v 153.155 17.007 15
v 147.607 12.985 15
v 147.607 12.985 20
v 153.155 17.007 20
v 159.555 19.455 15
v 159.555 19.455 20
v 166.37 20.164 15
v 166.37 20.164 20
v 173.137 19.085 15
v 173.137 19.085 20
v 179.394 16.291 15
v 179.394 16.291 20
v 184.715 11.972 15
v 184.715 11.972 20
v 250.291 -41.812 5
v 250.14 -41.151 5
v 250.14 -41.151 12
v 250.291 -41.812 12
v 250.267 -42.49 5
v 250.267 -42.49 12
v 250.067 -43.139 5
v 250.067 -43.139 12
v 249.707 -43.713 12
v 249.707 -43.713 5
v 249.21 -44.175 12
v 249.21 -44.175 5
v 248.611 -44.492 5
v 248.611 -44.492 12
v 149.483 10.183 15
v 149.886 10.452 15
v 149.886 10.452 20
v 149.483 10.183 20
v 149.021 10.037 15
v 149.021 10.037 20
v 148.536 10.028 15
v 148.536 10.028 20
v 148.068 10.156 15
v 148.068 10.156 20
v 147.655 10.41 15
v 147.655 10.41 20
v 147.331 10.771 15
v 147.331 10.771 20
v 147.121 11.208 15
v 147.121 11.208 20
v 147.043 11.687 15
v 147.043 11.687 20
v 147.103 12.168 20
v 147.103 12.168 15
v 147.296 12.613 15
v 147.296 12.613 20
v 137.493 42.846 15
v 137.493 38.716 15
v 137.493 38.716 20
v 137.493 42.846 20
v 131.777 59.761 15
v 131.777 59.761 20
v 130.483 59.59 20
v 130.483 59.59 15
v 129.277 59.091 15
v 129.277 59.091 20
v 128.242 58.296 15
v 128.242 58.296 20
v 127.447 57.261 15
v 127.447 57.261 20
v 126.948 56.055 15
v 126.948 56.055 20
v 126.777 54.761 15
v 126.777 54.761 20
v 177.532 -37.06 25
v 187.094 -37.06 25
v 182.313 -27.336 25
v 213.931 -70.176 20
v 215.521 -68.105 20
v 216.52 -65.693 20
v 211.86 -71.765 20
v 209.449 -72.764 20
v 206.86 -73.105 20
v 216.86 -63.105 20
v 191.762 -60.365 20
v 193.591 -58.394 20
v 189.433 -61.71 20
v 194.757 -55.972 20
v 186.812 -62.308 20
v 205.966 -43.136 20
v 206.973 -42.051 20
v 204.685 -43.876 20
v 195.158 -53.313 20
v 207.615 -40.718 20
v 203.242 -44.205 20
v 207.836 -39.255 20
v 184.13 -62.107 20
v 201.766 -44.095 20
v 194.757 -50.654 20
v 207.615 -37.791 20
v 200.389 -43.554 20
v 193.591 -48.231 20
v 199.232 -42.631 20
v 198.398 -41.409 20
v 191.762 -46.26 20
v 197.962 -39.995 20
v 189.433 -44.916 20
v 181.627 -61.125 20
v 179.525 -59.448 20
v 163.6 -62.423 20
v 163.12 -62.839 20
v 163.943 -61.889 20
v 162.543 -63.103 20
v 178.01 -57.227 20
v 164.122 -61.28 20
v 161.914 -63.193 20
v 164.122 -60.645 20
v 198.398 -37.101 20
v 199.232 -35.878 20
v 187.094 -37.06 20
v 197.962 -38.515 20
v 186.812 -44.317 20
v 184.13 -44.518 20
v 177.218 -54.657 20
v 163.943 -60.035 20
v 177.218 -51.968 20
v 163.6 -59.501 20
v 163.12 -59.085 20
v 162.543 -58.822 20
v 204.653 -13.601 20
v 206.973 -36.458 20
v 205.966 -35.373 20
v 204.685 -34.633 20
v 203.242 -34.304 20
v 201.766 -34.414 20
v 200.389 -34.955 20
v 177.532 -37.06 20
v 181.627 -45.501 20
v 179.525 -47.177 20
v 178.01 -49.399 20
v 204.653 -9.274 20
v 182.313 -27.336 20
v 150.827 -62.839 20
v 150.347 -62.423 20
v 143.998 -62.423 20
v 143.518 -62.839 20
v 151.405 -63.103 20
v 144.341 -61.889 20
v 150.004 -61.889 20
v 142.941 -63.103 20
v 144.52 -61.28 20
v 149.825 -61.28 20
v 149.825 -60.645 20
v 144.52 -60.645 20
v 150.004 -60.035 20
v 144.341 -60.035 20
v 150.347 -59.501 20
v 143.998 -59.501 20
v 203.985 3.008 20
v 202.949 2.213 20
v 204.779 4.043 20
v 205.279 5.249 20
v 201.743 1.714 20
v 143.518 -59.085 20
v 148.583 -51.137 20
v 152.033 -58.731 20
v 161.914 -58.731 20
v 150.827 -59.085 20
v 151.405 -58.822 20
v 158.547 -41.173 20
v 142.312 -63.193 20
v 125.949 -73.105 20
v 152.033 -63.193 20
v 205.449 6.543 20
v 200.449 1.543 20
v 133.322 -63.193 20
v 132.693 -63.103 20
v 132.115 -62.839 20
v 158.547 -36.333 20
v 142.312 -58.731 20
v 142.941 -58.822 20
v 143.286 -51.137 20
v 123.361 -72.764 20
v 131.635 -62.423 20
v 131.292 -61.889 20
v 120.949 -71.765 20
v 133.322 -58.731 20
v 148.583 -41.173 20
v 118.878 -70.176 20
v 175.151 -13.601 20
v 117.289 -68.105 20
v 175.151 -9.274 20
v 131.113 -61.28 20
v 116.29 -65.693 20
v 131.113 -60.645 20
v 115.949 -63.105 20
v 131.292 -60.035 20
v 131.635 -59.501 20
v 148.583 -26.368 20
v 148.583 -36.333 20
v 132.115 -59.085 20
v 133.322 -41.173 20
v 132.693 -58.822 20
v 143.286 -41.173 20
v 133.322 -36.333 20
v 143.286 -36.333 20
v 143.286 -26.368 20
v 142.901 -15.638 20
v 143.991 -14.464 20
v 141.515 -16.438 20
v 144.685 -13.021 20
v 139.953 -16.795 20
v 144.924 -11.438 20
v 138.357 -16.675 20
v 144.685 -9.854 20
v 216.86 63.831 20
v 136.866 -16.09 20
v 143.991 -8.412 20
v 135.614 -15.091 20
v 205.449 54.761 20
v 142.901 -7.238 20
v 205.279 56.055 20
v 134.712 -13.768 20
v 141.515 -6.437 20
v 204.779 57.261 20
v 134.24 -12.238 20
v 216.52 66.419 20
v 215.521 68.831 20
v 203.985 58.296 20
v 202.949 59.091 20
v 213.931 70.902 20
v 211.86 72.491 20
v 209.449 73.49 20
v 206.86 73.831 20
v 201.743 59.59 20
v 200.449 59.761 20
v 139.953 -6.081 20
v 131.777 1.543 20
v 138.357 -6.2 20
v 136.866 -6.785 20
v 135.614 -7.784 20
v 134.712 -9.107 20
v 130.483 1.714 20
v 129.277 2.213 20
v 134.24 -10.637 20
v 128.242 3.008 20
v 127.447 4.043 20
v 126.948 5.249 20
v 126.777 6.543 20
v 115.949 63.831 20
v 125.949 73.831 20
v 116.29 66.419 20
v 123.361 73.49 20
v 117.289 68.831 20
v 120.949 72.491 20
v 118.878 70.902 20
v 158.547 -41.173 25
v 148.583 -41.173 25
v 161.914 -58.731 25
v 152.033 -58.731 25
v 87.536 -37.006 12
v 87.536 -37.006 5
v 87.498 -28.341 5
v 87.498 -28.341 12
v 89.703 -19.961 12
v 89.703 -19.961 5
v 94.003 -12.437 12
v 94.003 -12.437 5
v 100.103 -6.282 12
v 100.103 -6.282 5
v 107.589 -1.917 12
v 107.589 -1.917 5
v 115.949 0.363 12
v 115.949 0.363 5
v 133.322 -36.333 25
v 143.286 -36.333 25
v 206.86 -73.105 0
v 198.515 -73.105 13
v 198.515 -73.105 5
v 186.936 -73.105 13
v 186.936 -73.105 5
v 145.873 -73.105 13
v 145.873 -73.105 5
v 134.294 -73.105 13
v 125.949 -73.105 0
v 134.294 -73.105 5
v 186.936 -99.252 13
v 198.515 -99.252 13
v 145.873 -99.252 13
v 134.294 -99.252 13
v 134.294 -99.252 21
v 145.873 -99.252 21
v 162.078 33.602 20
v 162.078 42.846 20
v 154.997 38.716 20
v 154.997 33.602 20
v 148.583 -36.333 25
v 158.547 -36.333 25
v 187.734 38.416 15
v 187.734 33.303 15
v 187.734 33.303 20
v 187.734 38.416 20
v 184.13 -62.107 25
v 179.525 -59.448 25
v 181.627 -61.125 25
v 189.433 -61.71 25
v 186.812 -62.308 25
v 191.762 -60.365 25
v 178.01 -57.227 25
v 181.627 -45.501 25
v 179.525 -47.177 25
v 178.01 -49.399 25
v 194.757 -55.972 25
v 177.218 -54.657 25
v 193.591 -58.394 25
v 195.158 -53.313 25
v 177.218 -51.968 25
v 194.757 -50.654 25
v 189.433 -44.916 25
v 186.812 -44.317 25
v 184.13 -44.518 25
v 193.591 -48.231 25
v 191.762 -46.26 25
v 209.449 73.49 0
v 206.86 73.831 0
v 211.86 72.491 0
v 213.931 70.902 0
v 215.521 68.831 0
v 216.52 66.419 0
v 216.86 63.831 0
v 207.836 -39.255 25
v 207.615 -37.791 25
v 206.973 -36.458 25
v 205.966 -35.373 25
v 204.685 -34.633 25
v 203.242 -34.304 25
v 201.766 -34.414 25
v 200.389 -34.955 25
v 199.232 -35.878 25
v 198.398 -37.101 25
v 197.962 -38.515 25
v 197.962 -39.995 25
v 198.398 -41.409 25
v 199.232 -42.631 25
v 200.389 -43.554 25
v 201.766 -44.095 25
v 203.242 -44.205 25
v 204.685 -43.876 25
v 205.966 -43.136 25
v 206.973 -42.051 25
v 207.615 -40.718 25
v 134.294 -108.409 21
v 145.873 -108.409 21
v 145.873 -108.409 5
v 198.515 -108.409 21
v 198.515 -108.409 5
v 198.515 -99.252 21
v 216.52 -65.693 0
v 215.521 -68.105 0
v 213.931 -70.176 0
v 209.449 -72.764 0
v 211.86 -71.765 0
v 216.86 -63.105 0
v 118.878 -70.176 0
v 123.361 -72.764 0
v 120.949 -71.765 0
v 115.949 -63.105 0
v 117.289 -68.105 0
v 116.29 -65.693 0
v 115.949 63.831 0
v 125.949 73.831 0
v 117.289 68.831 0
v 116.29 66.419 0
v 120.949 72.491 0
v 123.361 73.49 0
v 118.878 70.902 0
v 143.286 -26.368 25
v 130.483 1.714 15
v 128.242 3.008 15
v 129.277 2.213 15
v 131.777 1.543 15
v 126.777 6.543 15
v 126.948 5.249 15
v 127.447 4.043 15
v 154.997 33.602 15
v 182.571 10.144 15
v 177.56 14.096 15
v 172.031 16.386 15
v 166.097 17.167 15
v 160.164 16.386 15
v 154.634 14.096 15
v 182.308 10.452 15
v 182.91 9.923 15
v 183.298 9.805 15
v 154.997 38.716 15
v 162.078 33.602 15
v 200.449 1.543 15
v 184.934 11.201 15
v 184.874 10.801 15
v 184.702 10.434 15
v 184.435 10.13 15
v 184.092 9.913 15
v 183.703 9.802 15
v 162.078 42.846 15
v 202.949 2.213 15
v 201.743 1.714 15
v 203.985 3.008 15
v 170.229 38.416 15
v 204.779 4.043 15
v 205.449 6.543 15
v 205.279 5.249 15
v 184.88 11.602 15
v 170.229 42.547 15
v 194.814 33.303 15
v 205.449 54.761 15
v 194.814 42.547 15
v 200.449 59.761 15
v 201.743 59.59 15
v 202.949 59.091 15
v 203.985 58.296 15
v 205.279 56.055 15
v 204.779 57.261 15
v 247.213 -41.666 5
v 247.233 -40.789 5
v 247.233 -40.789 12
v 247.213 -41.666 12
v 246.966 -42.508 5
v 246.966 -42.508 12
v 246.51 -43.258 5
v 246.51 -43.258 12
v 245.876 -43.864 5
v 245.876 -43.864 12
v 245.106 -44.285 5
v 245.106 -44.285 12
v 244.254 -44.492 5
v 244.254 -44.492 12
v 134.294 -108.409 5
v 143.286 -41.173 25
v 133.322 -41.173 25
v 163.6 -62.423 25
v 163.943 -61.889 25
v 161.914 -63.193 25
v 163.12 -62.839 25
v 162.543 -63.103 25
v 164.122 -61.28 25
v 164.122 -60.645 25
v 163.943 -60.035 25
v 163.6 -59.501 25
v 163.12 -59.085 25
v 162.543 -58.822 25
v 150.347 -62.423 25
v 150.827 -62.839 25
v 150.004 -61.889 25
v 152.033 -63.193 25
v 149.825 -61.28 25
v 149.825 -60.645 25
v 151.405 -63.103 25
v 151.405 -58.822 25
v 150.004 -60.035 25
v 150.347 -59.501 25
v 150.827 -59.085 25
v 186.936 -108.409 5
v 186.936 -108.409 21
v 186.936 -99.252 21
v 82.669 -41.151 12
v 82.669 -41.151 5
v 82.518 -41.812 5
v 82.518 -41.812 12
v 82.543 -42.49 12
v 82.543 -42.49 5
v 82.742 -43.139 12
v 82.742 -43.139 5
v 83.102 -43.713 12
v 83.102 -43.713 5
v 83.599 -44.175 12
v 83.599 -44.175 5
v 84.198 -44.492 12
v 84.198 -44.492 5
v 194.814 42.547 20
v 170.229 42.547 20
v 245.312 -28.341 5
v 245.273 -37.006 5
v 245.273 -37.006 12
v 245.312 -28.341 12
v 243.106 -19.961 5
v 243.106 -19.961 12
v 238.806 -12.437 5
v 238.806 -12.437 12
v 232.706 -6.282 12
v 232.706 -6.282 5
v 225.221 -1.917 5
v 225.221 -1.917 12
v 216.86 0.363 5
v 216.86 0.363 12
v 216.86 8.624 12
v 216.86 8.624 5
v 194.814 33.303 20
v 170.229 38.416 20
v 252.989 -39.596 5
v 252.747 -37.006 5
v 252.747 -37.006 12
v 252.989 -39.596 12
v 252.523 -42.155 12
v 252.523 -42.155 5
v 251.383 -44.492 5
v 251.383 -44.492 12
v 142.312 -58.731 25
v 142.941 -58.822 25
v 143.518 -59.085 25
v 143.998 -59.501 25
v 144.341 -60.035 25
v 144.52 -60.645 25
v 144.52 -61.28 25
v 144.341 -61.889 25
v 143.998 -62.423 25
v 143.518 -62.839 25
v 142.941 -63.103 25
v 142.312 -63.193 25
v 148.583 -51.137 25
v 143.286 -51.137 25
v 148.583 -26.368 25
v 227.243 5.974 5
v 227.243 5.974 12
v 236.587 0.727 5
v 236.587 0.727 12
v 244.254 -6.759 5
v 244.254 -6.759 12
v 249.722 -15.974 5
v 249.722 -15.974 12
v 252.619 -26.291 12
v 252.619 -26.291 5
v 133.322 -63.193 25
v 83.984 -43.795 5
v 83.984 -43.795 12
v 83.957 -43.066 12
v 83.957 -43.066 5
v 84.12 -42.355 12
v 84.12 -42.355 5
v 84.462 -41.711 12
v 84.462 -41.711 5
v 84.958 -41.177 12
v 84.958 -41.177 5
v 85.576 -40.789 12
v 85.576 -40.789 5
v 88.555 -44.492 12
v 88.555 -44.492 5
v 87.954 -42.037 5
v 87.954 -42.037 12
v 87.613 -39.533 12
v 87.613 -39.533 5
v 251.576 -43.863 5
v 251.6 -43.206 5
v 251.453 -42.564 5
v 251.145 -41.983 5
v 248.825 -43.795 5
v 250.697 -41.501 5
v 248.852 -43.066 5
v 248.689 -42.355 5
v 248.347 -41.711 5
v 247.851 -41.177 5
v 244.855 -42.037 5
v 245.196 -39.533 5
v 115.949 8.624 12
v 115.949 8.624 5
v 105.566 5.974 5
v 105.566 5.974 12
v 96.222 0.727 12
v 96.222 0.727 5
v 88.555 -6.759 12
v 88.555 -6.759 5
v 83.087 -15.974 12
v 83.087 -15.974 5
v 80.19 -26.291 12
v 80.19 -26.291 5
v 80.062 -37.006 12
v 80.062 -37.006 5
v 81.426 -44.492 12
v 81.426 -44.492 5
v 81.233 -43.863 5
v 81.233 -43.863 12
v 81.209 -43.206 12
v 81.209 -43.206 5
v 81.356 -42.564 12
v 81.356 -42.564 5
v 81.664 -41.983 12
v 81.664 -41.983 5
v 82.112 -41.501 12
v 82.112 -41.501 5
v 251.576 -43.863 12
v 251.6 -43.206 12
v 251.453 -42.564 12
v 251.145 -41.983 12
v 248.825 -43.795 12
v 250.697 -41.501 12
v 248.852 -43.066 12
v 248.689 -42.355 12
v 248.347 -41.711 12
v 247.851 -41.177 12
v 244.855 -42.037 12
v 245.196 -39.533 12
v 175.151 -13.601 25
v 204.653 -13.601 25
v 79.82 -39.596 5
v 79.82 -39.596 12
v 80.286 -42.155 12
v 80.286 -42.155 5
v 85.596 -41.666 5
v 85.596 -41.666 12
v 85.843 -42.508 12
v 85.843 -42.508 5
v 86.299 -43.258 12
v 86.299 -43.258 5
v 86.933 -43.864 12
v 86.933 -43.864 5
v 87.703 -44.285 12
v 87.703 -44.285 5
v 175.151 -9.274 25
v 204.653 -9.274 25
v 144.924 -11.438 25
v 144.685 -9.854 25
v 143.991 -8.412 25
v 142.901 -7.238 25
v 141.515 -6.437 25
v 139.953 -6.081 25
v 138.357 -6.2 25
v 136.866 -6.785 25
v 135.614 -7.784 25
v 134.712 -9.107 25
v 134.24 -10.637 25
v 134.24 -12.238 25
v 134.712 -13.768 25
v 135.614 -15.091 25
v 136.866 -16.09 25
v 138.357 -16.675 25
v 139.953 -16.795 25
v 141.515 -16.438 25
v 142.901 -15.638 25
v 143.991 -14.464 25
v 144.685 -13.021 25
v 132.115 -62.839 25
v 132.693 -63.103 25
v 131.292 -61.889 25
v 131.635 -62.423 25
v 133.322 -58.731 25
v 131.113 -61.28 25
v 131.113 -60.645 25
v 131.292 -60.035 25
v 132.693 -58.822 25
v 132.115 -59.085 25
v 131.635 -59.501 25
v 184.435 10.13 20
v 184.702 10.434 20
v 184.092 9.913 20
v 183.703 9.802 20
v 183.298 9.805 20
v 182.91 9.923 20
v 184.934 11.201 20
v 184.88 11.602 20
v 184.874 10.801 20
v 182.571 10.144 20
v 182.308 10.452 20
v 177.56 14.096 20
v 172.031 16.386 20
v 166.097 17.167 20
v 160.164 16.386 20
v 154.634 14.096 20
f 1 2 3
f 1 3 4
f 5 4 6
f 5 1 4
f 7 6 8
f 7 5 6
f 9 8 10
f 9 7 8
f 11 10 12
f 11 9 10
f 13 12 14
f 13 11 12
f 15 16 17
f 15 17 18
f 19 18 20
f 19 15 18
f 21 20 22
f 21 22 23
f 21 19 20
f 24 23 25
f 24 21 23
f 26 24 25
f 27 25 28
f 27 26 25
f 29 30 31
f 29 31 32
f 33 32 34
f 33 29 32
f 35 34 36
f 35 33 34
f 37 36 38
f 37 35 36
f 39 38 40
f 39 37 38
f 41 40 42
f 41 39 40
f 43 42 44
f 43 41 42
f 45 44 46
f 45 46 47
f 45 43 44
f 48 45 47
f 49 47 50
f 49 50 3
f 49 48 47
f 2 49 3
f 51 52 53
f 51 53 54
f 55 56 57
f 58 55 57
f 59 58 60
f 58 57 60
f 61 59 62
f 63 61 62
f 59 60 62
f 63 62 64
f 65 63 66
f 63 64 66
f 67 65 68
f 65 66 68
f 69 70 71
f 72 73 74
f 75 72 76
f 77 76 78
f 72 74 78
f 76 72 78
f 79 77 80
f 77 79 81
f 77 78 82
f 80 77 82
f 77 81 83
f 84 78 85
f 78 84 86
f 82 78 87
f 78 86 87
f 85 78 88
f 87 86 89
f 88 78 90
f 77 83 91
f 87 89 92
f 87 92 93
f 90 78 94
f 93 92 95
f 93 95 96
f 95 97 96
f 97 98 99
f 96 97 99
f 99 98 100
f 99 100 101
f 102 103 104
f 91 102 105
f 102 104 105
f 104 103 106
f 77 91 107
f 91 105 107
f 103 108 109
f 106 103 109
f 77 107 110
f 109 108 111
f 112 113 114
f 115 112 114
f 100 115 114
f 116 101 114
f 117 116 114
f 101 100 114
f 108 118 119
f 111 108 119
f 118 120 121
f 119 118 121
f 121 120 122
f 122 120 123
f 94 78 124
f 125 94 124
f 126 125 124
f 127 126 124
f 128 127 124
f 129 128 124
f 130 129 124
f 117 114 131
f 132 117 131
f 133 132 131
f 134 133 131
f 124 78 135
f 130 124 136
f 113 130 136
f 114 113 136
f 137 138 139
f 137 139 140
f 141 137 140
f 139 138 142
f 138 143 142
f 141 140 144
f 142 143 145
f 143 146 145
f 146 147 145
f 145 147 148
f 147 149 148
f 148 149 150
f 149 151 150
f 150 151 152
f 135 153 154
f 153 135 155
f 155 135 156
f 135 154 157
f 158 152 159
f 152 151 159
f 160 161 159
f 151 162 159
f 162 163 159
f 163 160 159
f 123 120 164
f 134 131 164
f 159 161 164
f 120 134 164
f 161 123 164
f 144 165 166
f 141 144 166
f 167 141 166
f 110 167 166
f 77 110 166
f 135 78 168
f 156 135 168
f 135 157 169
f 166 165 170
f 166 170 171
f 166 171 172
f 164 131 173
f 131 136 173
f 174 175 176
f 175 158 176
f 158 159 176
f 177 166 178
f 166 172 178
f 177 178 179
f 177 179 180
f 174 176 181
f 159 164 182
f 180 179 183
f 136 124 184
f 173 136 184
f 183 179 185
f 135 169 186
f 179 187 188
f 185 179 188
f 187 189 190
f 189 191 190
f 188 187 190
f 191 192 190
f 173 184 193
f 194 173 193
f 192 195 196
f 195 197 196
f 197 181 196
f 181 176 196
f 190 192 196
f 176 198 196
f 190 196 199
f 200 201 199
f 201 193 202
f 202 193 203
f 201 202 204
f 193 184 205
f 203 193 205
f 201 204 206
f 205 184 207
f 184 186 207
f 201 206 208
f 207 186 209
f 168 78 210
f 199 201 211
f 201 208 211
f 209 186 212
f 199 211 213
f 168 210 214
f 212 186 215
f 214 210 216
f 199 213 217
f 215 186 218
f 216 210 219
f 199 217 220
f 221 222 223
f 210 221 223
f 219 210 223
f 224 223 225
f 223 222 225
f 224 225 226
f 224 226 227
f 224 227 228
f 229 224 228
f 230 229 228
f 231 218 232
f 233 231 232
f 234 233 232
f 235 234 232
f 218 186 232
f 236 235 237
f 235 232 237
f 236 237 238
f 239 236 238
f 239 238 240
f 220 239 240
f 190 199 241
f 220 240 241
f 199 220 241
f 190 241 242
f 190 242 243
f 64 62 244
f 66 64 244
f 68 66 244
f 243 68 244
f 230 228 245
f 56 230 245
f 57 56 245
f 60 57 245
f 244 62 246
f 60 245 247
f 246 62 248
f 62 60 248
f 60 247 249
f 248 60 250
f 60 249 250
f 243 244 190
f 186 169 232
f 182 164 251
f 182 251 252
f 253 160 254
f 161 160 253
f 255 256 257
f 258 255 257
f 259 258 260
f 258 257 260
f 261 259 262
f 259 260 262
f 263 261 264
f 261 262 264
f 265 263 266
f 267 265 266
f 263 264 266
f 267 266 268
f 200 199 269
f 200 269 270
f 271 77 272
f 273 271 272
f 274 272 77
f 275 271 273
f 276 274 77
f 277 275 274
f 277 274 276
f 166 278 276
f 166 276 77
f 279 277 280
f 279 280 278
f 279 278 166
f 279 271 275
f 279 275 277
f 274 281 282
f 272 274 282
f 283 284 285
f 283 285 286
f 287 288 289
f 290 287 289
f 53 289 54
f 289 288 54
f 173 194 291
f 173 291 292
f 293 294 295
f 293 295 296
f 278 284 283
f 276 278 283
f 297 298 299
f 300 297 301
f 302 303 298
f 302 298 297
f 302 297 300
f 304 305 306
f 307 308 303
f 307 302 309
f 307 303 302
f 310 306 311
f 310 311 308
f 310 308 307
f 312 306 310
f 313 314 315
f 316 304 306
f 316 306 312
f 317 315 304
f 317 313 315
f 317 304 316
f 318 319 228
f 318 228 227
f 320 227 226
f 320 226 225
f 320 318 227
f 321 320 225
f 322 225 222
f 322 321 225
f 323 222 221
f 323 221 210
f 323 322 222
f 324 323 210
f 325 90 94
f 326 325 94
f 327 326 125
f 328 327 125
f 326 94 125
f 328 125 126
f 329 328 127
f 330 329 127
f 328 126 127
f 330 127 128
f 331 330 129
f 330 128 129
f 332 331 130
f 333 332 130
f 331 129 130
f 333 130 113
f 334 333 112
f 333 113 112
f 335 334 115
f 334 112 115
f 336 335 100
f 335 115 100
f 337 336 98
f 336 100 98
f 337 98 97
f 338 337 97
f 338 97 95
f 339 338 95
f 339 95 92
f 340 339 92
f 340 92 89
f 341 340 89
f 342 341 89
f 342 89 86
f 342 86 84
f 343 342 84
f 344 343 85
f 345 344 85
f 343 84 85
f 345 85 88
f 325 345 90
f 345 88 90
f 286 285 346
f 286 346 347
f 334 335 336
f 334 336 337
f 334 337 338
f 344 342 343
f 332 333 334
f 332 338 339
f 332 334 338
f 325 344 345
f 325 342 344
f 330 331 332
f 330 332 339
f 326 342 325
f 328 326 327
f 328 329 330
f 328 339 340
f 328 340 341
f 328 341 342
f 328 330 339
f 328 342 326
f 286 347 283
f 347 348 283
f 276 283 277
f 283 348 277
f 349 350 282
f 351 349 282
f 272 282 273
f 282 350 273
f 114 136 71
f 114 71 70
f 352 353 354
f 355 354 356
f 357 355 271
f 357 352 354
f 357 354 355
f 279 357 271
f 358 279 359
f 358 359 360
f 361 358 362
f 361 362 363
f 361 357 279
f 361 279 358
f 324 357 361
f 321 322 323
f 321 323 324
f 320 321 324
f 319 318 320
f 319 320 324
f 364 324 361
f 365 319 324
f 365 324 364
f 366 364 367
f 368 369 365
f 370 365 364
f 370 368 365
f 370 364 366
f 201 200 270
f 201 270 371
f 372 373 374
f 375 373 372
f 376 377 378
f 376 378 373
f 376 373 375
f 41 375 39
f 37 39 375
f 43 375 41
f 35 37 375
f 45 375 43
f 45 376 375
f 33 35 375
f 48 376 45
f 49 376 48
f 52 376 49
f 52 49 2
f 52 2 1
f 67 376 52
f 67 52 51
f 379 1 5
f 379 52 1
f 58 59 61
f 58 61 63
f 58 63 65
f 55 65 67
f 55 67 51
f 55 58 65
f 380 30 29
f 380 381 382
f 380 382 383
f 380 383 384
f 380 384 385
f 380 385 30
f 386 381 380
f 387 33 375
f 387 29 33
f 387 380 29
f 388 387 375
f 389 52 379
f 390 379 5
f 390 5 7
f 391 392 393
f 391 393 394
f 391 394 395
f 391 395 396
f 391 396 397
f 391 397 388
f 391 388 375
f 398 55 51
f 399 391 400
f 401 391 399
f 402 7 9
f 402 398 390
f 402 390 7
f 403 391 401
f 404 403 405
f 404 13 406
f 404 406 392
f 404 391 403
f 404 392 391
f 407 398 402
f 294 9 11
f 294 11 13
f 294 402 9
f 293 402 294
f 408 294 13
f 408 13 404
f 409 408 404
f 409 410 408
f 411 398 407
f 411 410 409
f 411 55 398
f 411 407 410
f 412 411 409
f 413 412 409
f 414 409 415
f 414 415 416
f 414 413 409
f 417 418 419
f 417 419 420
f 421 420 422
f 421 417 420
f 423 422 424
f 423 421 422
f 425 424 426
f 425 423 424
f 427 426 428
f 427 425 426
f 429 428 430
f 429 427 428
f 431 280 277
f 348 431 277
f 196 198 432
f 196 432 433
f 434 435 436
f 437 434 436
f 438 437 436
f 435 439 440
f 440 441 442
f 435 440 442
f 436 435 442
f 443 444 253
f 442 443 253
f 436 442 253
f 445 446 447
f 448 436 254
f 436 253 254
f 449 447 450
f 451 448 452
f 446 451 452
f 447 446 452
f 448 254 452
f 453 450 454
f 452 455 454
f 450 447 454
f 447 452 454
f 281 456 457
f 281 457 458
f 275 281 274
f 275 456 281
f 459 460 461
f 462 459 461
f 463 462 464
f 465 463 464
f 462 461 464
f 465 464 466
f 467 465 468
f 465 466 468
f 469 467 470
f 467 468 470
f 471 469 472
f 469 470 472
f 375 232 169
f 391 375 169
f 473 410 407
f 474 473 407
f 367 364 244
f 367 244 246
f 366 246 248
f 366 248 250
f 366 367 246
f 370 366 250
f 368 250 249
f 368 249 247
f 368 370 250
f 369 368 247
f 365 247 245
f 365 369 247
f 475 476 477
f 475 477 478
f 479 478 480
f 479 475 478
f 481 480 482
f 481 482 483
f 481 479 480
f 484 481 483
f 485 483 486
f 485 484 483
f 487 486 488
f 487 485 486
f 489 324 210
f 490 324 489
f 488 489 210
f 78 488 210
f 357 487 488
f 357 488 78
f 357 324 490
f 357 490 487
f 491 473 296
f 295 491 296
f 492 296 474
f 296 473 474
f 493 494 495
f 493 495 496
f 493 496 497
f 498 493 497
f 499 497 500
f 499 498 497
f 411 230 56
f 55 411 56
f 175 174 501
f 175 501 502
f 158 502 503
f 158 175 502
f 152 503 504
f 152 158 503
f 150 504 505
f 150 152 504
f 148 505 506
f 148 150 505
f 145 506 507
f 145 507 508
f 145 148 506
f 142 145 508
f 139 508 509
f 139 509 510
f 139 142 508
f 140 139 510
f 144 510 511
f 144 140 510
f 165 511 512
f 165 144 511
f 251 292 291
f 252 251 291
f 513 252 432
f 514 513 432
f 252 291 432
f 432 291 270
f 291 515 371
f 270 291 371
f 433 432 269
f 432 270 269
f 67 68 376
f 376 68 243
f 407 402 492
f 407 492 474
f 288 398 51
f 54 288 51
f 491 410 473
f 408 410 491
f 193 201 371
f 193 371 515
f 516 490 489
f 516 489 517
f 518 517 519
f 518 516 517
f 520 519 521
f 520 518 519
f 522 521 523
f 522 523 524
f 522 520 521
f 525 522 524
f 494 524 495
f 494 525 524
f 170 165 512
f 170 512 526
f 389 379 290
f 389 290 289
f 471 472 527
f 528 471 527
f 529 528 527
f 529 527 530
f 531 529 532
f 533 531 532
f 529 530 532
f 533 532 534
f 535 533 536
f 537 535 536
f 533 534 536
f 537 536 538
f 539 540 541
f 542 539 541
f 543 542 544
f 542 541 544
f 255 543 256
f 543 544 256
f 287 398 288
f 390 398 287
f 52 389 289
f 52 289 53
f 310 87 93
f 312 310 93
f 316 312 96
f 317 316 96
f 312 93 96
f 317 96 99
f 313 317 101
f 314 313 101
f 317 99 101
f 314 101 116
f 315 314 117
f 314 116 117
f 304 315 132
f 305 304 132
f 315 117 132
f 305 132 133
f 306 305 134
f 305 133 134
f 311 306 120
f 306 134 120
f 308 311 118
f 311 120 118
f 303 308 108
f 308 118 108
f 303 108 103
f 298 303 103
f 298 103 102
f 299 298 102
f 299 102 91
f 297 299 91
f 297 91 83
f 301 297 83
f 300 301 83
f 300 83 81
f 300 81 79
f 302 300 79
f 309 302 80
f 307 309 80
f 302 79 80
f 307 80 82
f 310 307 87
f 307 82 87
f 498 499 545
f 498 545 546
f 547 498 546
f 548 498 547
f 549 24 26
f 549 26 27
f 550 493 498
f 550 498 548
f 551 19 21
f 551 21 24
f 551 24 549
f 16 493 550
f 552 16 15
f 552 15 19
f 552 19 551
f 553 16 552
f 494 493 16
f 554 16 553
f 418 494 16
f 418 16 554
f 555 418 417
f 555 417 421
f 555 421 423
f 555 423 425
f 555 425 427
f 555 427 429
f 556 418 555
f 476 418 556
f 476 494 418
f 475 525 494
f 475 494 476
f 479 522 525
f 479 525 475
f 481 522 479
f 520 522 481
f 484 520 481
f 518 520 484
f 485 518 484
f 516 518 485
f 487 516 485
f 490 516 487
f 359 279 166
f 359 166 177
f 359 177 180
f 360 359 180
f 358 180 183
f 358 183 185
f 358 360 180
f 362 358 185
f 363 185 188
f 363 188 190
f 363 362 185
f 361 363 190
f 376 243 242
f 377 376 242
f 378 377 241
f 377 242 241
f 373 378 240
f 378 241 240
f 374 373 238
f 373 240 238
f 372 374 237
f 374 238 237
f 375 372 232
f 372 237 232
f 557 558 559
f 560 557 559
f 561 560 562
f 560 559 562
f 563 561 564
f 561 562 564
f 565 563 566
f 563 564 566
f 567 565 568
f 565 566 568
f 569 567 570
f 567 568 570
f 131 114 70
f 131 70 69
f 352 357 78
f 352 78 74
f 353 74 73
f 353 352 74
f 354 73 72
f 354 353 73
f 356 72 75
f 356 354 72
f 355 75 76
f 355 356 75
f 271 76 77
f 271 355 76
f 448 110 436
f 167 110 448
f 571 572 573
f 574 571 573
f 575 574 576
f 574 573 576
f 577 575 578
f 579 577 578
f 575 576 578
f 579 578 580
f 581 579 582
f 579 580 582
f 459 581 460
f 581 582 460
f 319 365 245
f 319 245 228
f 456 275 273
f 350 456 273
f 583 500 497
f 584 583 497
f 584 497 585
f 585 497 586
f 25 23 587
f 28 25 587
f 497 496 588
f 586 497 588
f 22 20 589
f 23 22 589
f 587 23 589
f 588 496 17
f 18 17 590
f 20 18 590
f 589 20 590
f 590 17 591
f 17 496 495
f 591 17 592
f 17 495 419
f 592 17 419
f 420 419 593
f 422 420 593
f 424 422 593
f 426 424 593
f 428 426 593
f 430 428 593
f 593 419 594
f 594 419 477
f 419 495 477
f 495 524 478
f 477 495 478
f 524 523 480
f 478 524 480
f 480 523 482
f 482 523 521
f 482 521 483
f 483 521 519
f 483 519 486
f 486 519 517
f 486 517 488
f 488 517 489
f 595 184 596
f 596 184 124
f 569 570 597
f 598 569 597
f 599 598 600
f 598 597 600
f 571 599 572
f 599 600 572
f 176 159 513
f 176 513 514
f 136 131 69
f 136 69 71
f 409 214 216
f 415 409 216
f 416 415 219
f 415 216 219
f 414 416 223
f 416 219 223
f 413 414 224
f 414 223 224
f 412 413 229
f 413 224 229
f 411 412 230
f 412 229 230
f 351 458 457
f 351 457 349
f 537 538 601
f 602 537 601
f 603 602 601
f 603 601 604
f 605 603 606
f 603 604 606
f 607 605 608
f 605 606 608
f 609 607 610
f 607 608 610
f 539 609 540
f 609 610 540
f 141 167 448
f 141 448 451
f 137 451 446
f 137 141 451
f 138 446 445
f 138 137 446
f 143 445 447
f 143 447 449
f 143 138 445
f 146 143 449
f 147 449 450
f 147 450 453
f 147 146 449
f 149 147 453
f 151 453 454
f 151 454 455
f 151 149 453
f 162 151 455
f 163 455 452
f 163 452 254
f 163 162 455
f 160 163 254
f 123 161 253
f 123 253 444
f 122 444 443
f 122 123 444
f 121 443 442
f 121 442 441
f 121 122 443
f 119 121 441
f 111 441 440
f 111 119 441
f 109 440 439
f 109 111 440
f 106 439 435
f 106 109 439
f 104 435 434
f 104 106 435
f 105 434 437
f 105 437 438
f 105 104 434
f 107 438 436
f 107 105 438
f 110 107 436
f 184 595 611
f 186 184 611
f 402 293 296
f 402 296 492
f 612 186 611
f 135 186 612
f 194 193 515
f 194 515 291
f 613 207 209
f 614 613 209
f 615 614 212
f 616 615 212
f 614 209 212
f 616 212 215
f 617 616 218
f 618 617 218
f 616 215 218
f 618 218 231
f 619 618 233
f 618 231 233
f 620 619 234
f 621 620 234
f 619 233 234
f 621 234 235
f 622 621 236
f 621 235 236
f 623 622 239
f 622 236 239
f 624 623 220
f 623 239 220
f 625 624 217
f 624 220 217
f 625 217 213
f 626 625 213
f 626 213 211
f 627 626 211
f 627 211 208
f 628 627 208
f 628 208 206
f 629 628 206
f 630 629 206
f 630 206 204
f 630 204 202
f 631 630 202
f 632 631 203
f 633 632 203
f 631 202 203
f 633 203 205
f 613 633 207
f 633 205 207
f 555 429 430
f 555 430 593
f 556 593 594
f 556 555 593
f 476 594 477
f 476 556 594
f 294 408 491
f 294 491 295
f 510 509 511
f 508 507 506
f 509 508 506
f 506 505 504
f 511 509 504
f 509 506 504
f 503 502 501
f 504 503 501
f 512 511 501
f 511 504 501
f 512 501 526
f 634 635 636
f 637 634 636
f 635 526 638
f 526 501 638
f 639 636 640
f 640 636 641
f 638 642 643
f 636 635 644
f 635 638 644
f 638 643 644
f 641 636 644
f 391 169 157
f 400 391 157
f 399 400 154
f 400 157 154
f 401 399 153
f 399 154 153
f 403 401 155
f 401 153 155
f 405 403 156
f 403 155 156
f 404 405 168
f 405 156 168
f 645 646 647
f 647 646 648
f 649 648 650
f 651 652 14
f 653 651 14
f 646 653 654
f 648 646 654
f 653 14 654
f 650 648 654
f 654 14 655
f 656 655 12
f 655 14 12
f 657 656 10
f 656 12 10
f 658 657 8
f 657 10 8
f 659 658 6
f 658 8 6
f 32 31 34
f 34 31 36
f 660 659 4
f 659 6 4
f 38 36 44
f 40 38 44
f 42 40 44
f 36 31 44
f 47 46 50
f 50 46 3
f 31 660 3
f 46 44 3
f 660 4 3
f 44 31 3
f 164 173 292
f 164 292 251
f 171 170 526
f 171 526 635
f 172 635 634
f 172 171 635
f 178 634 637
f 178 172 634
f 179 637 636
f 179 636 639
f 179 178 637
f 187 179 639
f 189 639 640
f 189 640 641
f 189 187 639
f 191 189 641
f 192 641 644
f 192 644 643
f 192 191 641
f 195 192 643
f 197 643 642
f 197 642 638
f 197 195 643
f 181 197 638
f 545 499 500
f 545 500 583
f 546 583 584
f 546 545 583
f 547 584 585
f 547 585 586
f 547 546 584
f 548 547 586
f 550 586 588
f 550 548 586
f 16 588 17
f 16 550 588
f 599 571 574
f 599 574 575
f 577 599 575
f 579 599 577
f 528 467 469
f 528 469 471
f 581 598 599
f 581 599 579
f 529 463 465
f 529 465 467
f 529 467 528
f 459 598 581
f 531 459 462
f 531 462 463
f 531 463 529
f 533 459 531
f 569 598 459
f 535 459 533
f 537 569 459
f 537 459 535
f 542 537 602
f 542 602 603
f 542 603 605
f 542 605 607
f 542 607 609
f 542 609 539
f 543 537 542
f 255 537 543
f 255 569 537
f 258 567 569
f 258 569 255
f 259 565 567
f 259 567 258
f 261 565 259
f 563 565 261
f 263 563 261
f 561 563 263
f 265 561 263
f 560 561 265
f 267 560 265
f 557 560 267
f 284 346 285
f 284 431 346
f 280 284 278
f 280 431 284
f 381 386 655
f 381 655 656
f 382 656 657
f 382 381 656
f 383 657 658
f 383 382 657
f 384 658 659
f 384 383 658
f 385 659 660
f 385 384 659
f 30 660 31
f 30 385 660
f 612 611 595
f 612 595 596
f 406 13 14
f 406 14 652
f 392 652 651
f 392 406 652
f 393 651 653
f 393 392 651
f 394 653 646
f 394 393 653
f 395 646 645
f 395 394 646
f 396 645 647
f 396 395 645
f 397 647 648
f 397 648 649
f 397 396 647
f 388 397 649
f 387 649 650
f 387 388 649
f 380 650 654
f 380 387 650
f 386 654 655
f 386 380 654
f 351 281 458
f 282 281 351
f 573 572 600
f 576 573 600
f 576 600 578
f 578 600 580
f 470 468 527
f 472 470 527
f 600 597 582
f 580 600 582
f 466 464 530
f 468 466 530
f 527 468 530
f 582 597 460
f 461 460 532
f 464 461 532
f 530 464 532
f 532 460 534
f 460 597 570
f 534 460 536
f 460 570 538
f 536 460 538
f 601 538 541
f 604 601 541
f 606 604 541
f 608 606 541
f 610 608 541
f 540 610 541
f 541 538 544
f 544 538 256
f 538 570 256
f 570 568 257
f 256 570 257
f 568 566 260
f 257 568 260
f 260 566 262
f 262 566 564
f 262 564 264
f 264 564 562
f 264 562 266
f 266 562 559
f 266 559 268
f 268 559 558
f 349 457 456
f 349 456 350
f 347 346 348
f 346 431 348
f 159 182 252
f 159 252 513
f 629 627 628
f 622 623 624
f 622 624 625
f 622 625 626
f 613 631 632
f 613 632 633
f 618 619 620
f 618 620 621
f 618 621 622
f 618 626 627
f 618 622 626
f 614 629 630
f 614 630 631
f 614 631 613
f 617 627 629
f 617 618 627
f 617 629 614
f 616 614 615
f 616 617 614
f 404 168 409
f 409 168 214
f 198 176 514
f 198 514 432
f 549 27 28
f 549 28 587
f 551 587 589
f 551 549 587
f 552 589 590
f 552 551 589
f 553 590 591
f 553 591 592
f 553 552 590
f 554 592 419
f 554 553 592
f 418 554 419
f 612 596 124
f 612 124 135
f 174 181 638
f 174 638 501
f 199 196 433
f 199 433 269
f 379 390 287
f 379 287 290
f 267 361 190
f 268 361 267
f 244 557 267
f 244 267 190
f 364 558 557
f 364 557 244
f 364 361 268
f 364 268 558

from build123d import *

# Parameters (mm, degrees)
SALIENTE_EXTRUIR1_DEPTH = 20
CORTAR_EXTRUIR1_DEPTH   = 5
CROQUIS4_R              = 5.371921572
CROQUIS4_R_2            = 4.964711246
CROQUIS4_R_3            = 9.020708029
CROQUIS4_W              = 29.502003405
CROQUIS4_H              = 4.3269605
SALIENTE_EXTRUIR2_DEPTH = 5
SALIENTE_EXTRUIR3_DEPTH = 7
SALIENTE_EXTRUIR4_DEPTH = 5
CROQUIS8_W              = 11.57899057
CROQUIS8_H              = 35.30452721
CROQUIS8_W_2            = 11.578990571
SALIENTE_EXTRUIR5_DEPTH = 8
CROQUIS10_W             = 11.578990571
CROQUIS10_H             = 9.157571022
CROQUIS10_W_2           = 11.57899057
SALIENTE_EXTRUIR6_DEPTH = 8


with BuildPart() as part:
    # Croquis2 → Saliente-Extruir1 (new body)
    with BuildSketch(Plane.XY):
        with BuildLine():
            Line((125.948771998, 73.831195148), (206.860426755, 73.831195148))
            ThreePointArc((206.860426755, 73.831195148), (213.931494567, 70.90226296), (216.860426755, 63.831195148))
            Line((216.860426755, 63.831195148), (216.860426755, -63.104823524))
            ThreePointArc((216.860426755, -63.104823524), (213.931494567, -70.175891336), (206.860426755, -73.104823524))
            Line((206.860426755, -73.104823524), (125.948771998, -73.104823524))
            ThreePointArc((125.948771998, -73.104823524), (118.877704186, -70.175891336), (115.948771998, -63.104823524))
            Line((115.948771998, -63.104823524), (115.948771998, 63.831195148))
            ThreePointArc((115.948771998, 63.831195148), (118.877704186, 70.90226296), (125.948771998, 73.831195148))
        make_face()
    extrude(amount=SALIENTE_EXTRUIR1_DEPTH)

    # Croquis3 → Cortar-Extruir1 (cut)
    with BuildSketch(Plane.XY.offset(20)):
        with BuildLine():
            Line((131.777213557, 1.543265948), (200.449222637, 1.543265948))
            ThreePointArc((200.449222637, 1.543265948), (203.984756543, 3.007732042), (205.449222637, 6.543265948))
            Line((205.449222637, 6.543265948), (205.449222637, 54.760552668))
            ThreePointArc((205.449222637, 54.760552668), (203.984756543, 58.296086574), (200.449222637, 59.760552668))
            Line((200.449222637, 59.760552668), (131.777213557, 59.760552668))
            ThreePointArc((131.777213557, 59.760552668), (128.241679651, 58.296086574), (126.777213557, 54.760552668))
            Line((126.777213557, 54.760552668), (126.777213557, 6.543265948))
            ThreePointArc((126.777213557, 6.543265948), (128.241679651, 3.007732042), (131.777213557, 1.543265948))
        make_face()
    extrude(amount=-CORTAR_EXTRUIR1_DEPTH, mode=Mode.SUBTRACT)

    # Croquis4 → Saliente-Extruir2 (add)
    with BuildSketch(Plane.XY.offset(20)):
        with Locations((139.552044207, -11.43761555)):
            Circle(CROQUIS4_R)
        with Locations((202.870894741, -39.254617567)):
            Circle(CROQUIS4_R_2)
        with Locations((186.137514813, -53.312706969)):
            Circle(CROQUIS4_R_3)
        with Locations((189.902130019, -11.43761555)):
            Rectangle(CROQUIS4_W, CROQUIS4_H)
        Polygon((143.285708697, -26.368371403), (148.582533347, -26.368371403), (148.582533347, -36.332523638), (158.546685582, -36.332523638), (158.546685582, -41.173023795), (148.582533347, -41.173023795), (148.582533347, -51.13717603), (143.285708697, -51.13717603), (143.285708697, -41.173023795), (133.321556462, -41.173023795), (133.321556462, -36.332523638), (143.285708697, -36.332523638), align=None)
        Polygon((177.531776564, -37.06014818), (182.312742258, -27.3361267), (187.093707951, -37.06014818), align=None)
        with BuildLine():
            Line((133.321556462, -58.731134755), (142.311995954, -58.731134755))
            ThreePointArc((142.311995954, -58.731134755), (144.543113278, -60.962252079), (142.311995954, -63.193369403))
            Line((142.311995954, -63.193369403), (133.321556462, -63.193369403))
            ThreePointArc((133.321556462, -63.193369403), (131.090439139, -60.962252079), (133.321556462, -58.731134755))
        make_face()
        with BuildLine():
            Line((152.033292864, -58.731134755), (161.913955298, -58.731134755))
            ThreePointArc((161.913955298, -58.731134755), (164.145072622, -60.962252079), (161.913955298, -63.193369403))
            Line((161.913955298, -63.193369403), (152.033292864, -63.193369403))
            ThreePointArc((152.033292864, -63.193369403), (149.802175541, -60.962252079), (152.033292864, -58.731134755))
        make_face()
    extrude(amount=SALIENTE_EXTRUIR2_DEPTH)

    # Croquis5 → Saliente-Extruir3 (add)
    with BuildSketch(Plane.XY.offset(5)):
        with BuildLine():
            Line((216.860426755, 0.363185812), (216.860426755, 8.623746765))
            ThreePointArc((216.860426755, 8.623746765), (244.254011859, -6.758756408), (252.747129342, -37.006018501))
            ThreePointArc((252.747129342, -37.006018501), (252.843911184, -40.891106139), (251.382973951, -44.492346907))
            ThreePointArc((251.382973951, -44.492346907), (251.453339476, -42.564380052), (250.139816979, -41.151345675))
            ThreePointArc((250.139816979, -41.151345675), (250.067291272, -43.138500016), (248.610877543, -44.492346907))
            ThreePointArc((248.610877543, -44.492346907), (248.688866874, -42.355493028), (247.233029791, -40.789362374))
            ThreePointArc((247.233029791, -40.789362374), (246.510434032, -43.257829455), (244.254011859, -44.492346907))
            ThreePointArc((244.254011859, -44.492346907), (245.058759657, -40.789362374), (245.273288479, -37.006018501))
            ThreePointArc((245.273288479, -37.006018501), (238.806273238, -12.436920009), (216.860426755, 0.363185812))
        make_face()
        with BuildLine():
            Line((115.948771998, 0.363185812), (115.948771998, 8.623746765))
            ThreePointArc((115.948771998, 8.623746765), (88.555186894, -6.758756408), (80.062069411, -37.006018501))
            ThreePointArc((80.062069411, -37.006018501), (79.965287568, -40.891106139), (81.426224802, -44.492346907))
            ThreePointArc((81.426224802, -44.492346907), (81.355859277, -42.564380052), (82.669381774, -41.151345675))
            ThreePointArc((82.669381774, -41.151345675), (82.741907481, -43.138500016), (84.19832121, -44.492346907))
            ThreePointArc((84.19832121, -44.492346907), (84.120331879, -42.355493028), (85.576168962, -40.789362374))
            ThreePointArc((85.576168962, -40.789362374), (86.29876472, -43.257829455), (88.555186894, -44.492346907))
            ThreePointArc((88.555186894, -44.492346907), (87.750439096, -40.789362374), (87.535910273, -37.006018501))
            ThreePointArc((87.535910273, -37.006018501), (94.002925515, -12.436920009), (115.948771998, 0.363185812))
        make_face()
    extrude(amount=SALIENTE_EXTRUIR3_DEPTH)

    # Croquis6 → Saliente-Extruir4 (add)
    with BuildSketch(Plane.XY.offset(15)):
        Polygon((170.229054201, 42.546624397), (187.733576221, 42.546624397), (194.814057039, 42.546624397), (194.814057039, 33.30266333), (187.733576221, 33.30266333), (187.733576221, 38.41634392), (170.229054201, 38.41634392), align=None)
        Polygon((137.492636039, 42.846070715), (154.99715806, 42.846070715), (162.077638877, 42.846070715), (162.077638877, 33.602109648), (154.99715806, 33.602109648), (154.99715806, 38.715790239), (137.492636039, 38.715790239), align=None)
        with BuildLine():
            ThreePointArc((147.606658689, 12.985413335), (166.370442462, 20.164117151), (184.714551358, 11.972228552))
            ThreePointArc((184.714551358, 11.972228552), (184.271283015, 10.009183036), (182.308237498, 10.452451378))
            ThreePointArc((182.308237498, 10.452451378), (166.097280974, 17.16724943), (149.88632445, 10.452451378))
            ThreePointArc((149.88632445, 10.452451378), (147.480010591, 10.579099476), (147.606658689, 12.985413335))
        make_face()
    extrude(amount=SALIENTE_EXTRUIR4_DEPTH)

    # Croquis8 → Saliente-Extruir5 (add)
    with BuildSketch(Plane.XY.offset(5)):
        with Locations((192.725958616, -90.757087129)):
            Rectangle(CROQUIS8_W, CROQUIS8_H)
        with Locations((140.083240137, -90.757087129)):
            Rectangle(CROQUIS8_W_2, CROQUIS8_H)
    extrude(amount=SALIENTE_EXTRUIR5_DEPTH)

    # Croquis10 → Saliente-Extruir6 (add)
    with BuildSketch(Plane.XY.offset(13)):
        with Locations((140.083240137, -103.830565223)):
            Rectangle(CROQUIS10_W, CROQUIS10_H)
        with Locations((192.725958616, -103.830565223)):
            Rectangle(CROQUIS10_W_2, CROQUIS10_H)
    extrude(amount=SALIENTE_EXTRUIR6_DEPTH)


solid = part.part
